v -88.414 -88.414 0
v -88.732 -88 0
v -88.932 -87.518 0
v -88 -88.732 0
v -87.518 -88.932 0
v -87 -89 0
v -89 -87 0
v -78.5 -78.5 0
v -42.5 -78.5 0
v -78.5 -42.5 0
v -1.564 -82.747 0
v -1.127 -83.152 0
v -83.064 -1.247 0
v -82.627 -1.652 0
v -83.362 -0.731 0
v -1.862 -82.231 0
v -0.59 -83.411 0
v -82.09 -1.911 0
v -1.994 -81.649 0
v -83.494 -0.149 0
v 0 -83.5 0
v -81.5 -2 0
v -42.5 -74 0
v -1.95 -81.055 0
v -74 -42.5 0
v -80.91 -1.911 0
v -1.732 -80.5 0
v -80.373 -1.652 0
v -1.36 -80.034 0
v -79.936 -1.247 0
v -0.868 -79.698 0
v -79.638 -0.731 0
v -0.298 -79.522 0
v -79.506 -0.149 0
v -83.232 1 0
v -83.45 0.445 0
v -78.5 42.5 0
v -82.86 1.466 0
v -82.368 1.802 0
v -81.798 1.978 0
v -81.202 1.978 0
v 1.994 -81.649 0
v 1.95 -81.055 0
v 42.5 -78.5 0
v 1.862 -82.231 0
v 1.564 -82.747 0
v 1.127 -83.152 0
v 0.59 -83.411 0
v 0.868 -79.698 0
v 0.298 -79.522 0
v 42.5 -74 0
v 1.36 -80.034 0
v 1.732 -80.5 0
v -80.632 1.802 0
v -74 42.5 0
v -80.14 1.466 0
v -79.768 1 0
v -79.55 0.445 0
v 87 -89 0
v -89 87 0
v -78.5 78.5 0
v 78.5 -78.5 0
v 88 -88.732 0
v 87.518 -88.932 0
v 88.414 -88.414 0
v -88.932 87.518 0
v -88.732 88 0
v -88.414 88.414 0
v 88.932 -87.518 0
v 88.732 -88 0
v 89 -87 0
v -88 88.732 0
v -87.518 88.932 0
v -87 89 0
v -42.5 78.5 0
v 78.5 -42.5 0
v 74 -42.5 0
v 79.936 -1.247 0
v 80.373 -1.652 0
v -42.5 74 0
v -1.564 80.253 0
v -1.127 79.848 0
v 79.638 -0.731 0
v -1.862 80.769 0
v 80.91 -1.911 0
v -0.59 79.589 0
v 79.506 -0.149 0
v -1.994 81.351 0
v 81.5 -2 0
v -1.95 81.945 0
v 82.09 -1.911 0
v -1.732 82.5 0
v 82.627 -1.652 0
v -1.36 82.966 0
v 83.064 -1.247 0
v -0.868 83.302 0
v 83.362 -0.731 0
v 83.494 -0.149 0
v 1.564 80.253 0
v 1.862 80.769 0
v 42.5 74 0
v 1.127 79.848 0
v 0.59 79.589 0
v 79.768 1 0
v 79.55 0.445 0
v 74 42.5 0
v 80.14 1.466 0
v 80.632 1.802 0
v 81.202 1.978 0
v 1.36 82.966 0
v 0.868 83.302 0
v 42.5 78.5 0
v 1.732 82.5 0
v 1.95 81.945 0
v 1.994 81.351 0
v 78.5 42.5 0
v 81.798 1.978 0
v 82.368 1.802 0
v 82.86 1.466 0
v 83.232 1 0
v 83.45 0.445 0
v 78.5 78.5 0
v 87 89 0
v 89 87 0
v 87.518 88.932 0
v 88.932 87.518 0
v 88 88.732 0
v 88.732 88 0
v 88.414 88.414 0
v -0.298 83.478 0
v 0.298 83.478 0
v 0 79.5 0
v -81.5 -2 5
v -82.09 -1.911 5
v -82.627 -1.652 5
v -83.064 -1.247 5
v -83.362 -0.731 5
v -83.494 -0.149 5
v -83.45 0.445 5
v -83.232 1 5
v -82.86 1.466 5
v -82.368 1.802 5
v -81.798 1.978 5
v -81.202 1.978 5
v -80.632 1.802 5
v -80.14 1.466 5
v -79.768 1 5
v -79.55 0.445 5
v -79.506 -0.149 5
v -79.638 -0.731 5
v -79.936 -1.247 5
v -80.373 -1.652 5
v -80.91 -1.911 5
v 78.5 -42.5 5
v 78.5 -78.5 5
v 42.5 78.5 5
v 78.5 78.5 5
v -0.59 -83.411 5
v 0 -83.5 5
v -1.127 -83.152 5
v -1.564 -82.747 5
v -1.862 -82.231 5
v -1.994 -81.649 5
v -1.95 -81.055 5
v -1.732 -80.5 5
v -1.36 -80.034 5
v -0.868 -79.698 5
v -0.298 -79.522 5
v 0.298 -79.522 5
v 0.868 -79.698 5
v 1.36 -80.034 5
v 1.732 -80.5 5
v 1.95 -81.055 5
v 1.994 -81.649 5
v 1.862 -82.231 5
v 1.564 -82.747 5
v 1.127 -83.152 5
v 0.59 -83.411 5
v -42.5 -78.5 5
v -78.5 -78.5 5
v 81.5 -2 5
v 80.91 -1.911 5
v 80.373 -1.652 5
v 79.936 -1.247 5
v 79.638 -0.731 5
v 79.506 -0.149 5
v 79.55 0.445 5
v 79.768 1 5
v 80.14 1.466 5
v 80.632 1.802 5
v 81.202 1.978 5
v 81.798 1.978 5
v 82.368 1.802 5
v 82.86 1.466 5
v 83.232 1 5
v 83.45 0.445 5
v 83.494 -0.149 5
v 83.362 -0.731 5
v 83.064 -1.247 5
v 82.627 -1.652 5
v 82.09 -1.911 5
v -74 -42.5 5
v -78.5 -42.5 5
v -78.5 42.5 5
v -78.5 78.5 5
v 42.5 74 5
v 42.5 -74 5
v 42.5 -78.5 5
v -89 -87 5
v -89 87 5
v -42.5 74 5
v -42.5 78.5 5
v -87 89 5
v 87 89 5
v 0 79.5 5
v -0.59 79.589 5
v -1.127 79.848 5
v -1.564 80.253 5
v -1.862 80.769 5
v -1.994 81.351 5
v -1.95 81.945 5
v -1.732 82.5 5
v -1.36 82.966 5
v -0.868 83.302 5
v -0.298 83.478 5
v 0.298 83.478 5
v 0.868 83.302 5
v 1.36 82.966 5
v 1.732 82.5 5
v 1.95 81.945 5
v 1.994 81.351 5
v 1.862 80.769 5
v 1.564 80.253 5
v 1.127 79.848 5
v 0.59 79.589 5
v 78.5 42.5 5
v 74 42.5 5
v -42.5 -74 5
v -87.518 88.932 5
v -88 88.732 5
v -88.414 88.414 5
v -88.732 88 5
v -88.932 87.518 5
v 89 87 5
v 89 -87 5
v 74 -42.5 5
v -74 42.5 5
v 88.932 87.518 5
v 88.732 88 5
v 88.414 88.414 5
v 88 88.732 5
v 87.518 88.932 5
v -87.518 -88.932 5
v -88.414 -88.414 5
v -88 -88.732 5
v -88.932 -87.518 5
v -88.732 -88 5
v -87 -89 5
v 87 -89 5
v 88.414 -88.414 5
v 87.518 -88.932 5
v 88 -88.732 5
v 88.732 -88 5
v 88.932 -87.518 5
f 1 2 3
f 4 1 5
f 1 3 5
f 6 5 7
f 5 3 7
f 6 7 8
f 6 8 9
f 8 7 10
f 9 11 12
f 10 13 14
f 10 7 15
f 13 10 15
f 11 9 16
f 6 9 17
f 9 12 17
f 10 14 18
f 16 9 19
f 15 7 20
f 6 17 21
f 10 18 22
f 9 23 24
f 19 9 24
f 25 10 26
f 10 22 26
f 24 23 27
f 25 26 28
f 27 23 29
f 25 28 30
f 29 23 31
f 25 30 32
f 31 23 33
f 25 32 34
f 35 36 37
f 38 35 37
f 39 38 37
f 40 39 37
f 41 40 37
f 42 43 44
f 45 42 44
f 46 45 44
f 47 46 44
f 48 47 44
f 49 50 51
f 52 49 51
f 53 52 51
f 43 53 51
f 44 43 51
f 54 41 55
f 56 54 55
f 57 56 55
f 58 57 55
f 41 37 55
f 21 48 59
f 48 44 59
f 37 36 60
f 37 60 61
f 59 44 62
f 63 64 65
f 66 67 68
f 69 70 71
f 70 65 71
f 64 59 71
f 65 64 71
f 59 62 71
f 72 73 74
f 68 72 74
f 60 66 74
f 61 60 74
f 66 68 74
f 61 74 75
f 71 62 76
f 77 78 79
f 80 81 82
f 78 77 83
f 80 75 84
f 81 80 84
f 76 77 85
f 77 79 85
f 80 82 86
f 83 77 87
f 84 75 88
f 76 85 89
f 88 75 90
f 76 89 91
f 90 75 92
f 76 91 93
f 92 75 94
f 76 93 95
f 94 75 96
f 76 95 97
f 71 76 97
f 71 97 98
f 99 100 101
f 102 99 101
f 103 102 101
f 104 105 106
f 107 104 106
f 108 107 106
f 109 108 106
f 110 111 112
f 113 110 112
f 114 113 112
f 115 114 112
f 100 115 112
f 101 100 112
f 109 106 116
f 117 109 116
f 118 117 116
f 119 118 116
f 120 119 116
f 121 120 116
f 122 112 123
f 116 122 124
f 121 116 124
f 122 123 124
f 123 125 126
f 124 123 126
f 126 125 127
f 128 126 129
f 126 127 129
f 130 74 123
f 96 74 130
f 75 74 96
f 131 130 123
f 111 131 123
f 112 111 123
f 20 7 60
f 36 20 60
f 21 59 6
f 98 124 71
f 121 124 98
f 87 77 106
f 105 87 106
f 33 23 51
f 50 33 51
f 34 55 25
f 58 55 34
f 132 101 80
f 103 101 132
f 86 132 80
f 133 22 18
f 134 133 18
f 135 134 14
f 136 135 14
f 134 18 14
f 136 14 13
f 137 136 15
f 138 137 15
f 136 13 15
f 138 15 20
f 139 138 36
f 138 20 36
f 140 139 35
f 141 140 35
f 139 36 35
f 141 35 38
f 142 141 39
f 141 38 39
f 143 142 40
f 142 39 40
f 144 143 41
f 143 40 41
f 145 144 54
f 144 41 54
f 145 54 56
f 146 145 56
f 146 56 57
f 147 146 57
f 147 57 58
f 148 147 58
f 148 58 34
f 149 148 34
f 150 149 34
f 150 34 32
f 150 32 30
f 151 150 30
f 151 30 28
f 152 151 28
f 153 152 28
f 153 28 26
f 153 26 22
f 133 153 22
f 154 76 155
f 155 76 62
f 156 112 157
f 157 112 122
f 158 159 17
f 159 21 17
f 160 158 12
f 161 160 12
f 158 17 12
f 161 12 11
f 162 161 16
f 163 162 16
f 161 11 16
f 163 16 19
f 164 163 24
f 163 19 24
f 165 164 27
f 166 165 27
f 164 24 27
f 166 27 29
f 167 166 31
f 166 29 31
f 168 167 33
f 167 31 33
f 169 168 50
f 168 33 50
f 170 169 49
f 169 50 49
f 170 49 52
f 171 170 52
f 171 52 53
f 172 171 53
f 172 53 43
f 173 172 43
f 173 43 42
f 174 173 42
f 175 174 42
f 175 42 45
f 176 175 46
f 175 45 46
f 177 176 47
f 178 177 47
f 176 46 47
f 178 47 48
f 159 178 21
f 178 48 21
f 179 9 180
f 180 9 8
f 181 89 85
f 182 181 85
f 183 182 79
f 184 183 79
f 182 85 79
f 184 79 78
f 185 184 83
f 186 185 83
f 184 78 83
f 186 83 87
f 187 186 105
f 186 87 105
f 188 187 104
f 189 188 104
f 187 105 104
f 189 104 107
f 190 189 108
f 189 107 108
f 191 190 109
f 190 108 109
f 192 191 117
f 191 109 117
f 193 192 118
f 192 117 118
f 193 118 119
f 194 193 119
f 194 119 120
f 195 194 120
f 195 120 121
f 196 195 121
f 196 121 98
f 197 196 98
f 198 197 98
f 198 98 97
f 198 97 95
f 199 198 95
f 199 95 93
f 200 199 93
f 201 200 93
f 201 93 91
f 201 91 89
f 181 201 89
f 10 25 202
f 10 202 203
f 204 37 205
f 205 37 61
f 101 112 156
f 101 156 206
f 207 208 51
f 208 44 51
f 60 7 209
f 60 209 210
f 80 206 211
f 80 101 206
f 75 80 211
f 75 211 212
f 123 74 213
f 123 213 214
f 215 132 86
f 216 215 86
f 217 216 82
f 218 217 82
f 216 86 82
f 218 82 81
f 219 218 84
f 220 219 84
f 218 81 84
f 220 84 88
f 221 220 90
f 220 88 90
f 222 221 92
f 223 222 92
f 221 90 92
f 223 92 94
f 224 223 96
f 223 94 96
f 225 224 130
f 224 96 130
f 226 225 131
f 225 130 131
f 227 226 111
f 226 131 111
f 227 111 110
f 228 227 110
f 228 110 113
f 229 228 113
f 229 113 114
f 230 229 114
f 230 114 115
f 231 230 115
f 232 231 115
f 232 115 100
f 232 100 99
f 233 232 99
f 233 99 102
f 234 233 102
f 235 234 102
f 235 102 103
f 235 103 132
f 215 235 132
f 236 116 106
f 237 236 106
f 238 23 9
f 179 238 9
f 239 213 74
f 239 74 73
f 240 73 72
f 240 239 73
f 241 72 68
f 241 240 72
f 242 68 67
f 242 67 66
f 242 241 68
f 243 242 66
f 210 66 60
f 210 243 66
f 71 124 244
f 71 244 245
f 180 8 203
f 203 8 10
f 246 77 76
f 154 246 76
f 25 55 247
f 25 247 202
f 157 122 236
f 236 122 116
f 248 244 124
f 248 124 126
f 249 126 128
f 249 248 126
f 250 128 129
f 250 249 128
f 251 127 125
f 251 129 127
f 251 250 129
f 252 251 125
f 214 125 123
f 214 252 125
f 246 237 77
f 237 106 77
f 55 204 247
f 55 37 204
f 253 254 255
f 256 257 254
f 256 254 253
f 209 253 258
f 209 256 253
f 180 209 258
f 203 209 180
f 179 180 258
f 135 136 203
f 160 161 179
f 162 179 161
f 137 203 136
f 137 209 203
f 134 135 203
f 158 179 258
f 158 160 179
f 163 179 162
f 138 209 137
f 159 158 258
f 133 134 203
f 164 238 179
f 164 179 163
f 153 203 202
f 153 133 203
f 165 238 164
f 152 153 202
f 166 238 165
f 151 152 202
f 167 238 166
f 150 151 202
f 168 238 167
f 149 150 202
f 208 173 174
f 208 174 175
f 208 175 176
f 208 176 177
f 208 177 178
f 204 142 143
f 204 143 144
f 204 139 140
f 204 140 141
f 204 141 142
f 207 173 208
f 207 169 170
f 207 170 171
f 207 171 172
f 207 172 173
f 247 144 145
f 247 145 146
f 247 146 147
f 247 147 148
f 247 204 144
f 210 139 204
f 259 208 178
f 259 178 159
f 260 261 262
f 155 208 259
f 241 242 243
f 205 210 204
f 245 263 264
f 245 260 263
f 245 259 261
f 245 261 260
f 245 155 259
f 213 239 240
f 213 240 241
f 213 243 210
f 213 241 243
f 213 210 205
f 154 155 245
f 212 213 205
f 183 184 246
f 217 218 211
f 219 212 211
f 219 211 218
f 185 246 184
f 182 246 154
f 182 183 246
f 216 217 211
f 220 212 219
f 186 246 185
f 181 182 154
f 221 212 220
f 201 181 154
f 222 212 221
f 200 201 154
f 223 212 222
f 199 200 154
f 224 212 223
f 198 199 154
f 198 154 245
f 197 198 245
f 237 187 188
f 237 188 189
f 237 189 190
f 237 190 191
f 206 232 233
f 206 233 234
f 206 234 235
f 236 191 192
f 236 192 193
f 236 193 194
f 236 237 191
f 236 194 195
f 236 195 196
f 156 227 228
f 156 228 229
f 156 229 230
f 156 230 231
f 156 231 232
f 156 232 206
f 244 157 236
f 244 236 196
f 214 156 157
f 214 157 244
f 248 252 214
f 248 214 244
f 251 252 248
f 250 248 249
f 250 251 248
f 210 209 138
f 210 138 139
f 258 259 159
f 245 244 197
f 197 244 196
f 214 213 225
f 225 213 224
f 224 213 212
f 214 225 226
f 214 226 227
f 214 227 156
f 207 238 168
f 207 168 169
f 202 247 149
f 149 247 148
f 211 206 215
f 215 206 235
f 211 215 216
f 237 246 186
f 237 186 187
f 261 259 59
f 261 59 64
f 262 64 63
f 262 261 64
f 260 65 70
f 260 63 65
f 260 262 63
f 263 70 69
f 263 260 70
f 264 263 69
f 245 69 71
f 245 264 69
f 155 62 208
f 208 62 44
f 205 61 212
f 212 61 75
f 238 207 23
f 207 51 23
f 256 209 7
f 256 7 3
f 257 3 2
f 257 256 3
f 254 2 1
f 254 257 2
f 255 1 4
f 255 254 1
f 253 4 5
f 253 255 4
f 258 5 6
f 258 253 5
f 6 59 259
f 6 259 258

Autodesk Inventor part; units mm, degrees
ref_plane "YZ Plane" through (0, 0, 0) normal (1, 0, 0) x (0, 1, 0)
ref_plane "XZ Plane" through (0, 0, 0) normal (0, 1, 0) x (-1, 0, 0)
ref_plane "XY Plane" through (0, 0, 0) normal (0, 0, 1) x (1, 0, 0)
sketch "Sketch1" plane through (0, 0, 0) normal (0, 0, 1) x (1, 0, 0)
  line L0 (-89, 89) -> (89, 89)
  line L1 (89, 89) -> (89, -89)
  line L2 (89, -89) -> (-89, -89)
  line L3 (-89, -89) -> (-89, 89)
  line L4 (-78.5, 42.5) -> (-74, 42.5)
  line L5 (-74, 42.5) -> (-74, -42.5)
  line L6 (-74, -42.5) -> (-78.5, -42.5)
  line L7 (42.5, 78.5) -> (42.5, 74)
  line L8 (42.5, 74) -> (-42.5, 74)
  line L9 (-42.5, 74) -> (-42.5, 78.5)
  line L10 (78.5, 42.5) -> (74, 42.5)
  line L11 (74, 42.5) -> (74, -42.5)
  line L12 (74, -42.5) -> (78.5, -42.5)
  line L13 (42.5, -78.5) -> (42.5, -74)
  line L14 (42.5, -74) -> (-42.5, -74)
  line L15 (-42.5, -74) -> (-42.5, -78.5)
  line L16 (-78.5, 78.5) -> (-42.5, 78.5)
  line L17 (42.5, 78.5) -> (78.5, 78.5)
  line L18 (-78.5, -78.5) -> (-78.5, -42.5)
  line L19 (-78.5, 42.5) -> (-78.5, 78.5)
  line L20 (78.5, -78.5) -> (42.5, -78.5)
  line L21 (-42.5, -78.5) -> (-78.5, -78.5)
  line L22 (78.5, 78.5) -> (78.5, 42.5)
  line L23 (78.5, -42.5) -> (78.5, -78.5)
  point P0 (0, 0)
  point P1 (-74, 0)
  point P2 (0, 74)
  dimension "d0" = 36
  dimension "d1" = 36
  dimension "d2" = 148
  dimension "d3" = 148
  dimension "d4" = 157
  dimension "d5" = 157
  dimension "d6" = 74
  dimension "d7" = 74
  dimension "d9" = 15
  dimension "d14" = 15
  dimension "d15" = 15
extrude "Extrusion1" add sketch "Sketch1" along normal blind 5
sketch "Sketch2" plane through (0, 0, 5) normal (0, 0, 1) x (1, 0, 0)
  circle A0 centre (-81.5, 0) radius 2
  circle A1 centre (81.5, 0) radius 2
  line L0 (-74, -42.5) -> (-74, 42.5) projected
  line L1 (74, 42.5) -> (74, -42.5) projected
  circle A2 centre (0, 81.5) radius 2
  circle A3 centre (0, -81.5) radius 2
  line L2 (-42.5, 74) -> (42.5, 74) projected
  line L3 (42.5, -74) -> (-42.5, -74) projected
  point P0 (0, 0)
  dimension "d16" = 7.5
  dimension "d17" = 7.5
  dimension "d18" = 4
  dimension "d19" = 7.5
  dimension "d20" = 7.5
hole "Hole1" at (-81.5, 0, 5) at (0, 81.5, 5) at (81.5, 0, 5) at (0, -81.5, 5) direction (0, 0, -1) diameter 4 end through all
fillet "Fillet1" radius 2 4 edges at (-89, -89, 2.5) (-89, 89, 2.5) (89, -89, 2.5) (89, 89, 2.5)
equation "\"d6\" = 0.5 * d3"
equation "\"d7\" = 0.5 * d2"
equation "\"d21\" = d18"
properties part number "WaagePlexiMittelsteuck" material "PET Plastic"
